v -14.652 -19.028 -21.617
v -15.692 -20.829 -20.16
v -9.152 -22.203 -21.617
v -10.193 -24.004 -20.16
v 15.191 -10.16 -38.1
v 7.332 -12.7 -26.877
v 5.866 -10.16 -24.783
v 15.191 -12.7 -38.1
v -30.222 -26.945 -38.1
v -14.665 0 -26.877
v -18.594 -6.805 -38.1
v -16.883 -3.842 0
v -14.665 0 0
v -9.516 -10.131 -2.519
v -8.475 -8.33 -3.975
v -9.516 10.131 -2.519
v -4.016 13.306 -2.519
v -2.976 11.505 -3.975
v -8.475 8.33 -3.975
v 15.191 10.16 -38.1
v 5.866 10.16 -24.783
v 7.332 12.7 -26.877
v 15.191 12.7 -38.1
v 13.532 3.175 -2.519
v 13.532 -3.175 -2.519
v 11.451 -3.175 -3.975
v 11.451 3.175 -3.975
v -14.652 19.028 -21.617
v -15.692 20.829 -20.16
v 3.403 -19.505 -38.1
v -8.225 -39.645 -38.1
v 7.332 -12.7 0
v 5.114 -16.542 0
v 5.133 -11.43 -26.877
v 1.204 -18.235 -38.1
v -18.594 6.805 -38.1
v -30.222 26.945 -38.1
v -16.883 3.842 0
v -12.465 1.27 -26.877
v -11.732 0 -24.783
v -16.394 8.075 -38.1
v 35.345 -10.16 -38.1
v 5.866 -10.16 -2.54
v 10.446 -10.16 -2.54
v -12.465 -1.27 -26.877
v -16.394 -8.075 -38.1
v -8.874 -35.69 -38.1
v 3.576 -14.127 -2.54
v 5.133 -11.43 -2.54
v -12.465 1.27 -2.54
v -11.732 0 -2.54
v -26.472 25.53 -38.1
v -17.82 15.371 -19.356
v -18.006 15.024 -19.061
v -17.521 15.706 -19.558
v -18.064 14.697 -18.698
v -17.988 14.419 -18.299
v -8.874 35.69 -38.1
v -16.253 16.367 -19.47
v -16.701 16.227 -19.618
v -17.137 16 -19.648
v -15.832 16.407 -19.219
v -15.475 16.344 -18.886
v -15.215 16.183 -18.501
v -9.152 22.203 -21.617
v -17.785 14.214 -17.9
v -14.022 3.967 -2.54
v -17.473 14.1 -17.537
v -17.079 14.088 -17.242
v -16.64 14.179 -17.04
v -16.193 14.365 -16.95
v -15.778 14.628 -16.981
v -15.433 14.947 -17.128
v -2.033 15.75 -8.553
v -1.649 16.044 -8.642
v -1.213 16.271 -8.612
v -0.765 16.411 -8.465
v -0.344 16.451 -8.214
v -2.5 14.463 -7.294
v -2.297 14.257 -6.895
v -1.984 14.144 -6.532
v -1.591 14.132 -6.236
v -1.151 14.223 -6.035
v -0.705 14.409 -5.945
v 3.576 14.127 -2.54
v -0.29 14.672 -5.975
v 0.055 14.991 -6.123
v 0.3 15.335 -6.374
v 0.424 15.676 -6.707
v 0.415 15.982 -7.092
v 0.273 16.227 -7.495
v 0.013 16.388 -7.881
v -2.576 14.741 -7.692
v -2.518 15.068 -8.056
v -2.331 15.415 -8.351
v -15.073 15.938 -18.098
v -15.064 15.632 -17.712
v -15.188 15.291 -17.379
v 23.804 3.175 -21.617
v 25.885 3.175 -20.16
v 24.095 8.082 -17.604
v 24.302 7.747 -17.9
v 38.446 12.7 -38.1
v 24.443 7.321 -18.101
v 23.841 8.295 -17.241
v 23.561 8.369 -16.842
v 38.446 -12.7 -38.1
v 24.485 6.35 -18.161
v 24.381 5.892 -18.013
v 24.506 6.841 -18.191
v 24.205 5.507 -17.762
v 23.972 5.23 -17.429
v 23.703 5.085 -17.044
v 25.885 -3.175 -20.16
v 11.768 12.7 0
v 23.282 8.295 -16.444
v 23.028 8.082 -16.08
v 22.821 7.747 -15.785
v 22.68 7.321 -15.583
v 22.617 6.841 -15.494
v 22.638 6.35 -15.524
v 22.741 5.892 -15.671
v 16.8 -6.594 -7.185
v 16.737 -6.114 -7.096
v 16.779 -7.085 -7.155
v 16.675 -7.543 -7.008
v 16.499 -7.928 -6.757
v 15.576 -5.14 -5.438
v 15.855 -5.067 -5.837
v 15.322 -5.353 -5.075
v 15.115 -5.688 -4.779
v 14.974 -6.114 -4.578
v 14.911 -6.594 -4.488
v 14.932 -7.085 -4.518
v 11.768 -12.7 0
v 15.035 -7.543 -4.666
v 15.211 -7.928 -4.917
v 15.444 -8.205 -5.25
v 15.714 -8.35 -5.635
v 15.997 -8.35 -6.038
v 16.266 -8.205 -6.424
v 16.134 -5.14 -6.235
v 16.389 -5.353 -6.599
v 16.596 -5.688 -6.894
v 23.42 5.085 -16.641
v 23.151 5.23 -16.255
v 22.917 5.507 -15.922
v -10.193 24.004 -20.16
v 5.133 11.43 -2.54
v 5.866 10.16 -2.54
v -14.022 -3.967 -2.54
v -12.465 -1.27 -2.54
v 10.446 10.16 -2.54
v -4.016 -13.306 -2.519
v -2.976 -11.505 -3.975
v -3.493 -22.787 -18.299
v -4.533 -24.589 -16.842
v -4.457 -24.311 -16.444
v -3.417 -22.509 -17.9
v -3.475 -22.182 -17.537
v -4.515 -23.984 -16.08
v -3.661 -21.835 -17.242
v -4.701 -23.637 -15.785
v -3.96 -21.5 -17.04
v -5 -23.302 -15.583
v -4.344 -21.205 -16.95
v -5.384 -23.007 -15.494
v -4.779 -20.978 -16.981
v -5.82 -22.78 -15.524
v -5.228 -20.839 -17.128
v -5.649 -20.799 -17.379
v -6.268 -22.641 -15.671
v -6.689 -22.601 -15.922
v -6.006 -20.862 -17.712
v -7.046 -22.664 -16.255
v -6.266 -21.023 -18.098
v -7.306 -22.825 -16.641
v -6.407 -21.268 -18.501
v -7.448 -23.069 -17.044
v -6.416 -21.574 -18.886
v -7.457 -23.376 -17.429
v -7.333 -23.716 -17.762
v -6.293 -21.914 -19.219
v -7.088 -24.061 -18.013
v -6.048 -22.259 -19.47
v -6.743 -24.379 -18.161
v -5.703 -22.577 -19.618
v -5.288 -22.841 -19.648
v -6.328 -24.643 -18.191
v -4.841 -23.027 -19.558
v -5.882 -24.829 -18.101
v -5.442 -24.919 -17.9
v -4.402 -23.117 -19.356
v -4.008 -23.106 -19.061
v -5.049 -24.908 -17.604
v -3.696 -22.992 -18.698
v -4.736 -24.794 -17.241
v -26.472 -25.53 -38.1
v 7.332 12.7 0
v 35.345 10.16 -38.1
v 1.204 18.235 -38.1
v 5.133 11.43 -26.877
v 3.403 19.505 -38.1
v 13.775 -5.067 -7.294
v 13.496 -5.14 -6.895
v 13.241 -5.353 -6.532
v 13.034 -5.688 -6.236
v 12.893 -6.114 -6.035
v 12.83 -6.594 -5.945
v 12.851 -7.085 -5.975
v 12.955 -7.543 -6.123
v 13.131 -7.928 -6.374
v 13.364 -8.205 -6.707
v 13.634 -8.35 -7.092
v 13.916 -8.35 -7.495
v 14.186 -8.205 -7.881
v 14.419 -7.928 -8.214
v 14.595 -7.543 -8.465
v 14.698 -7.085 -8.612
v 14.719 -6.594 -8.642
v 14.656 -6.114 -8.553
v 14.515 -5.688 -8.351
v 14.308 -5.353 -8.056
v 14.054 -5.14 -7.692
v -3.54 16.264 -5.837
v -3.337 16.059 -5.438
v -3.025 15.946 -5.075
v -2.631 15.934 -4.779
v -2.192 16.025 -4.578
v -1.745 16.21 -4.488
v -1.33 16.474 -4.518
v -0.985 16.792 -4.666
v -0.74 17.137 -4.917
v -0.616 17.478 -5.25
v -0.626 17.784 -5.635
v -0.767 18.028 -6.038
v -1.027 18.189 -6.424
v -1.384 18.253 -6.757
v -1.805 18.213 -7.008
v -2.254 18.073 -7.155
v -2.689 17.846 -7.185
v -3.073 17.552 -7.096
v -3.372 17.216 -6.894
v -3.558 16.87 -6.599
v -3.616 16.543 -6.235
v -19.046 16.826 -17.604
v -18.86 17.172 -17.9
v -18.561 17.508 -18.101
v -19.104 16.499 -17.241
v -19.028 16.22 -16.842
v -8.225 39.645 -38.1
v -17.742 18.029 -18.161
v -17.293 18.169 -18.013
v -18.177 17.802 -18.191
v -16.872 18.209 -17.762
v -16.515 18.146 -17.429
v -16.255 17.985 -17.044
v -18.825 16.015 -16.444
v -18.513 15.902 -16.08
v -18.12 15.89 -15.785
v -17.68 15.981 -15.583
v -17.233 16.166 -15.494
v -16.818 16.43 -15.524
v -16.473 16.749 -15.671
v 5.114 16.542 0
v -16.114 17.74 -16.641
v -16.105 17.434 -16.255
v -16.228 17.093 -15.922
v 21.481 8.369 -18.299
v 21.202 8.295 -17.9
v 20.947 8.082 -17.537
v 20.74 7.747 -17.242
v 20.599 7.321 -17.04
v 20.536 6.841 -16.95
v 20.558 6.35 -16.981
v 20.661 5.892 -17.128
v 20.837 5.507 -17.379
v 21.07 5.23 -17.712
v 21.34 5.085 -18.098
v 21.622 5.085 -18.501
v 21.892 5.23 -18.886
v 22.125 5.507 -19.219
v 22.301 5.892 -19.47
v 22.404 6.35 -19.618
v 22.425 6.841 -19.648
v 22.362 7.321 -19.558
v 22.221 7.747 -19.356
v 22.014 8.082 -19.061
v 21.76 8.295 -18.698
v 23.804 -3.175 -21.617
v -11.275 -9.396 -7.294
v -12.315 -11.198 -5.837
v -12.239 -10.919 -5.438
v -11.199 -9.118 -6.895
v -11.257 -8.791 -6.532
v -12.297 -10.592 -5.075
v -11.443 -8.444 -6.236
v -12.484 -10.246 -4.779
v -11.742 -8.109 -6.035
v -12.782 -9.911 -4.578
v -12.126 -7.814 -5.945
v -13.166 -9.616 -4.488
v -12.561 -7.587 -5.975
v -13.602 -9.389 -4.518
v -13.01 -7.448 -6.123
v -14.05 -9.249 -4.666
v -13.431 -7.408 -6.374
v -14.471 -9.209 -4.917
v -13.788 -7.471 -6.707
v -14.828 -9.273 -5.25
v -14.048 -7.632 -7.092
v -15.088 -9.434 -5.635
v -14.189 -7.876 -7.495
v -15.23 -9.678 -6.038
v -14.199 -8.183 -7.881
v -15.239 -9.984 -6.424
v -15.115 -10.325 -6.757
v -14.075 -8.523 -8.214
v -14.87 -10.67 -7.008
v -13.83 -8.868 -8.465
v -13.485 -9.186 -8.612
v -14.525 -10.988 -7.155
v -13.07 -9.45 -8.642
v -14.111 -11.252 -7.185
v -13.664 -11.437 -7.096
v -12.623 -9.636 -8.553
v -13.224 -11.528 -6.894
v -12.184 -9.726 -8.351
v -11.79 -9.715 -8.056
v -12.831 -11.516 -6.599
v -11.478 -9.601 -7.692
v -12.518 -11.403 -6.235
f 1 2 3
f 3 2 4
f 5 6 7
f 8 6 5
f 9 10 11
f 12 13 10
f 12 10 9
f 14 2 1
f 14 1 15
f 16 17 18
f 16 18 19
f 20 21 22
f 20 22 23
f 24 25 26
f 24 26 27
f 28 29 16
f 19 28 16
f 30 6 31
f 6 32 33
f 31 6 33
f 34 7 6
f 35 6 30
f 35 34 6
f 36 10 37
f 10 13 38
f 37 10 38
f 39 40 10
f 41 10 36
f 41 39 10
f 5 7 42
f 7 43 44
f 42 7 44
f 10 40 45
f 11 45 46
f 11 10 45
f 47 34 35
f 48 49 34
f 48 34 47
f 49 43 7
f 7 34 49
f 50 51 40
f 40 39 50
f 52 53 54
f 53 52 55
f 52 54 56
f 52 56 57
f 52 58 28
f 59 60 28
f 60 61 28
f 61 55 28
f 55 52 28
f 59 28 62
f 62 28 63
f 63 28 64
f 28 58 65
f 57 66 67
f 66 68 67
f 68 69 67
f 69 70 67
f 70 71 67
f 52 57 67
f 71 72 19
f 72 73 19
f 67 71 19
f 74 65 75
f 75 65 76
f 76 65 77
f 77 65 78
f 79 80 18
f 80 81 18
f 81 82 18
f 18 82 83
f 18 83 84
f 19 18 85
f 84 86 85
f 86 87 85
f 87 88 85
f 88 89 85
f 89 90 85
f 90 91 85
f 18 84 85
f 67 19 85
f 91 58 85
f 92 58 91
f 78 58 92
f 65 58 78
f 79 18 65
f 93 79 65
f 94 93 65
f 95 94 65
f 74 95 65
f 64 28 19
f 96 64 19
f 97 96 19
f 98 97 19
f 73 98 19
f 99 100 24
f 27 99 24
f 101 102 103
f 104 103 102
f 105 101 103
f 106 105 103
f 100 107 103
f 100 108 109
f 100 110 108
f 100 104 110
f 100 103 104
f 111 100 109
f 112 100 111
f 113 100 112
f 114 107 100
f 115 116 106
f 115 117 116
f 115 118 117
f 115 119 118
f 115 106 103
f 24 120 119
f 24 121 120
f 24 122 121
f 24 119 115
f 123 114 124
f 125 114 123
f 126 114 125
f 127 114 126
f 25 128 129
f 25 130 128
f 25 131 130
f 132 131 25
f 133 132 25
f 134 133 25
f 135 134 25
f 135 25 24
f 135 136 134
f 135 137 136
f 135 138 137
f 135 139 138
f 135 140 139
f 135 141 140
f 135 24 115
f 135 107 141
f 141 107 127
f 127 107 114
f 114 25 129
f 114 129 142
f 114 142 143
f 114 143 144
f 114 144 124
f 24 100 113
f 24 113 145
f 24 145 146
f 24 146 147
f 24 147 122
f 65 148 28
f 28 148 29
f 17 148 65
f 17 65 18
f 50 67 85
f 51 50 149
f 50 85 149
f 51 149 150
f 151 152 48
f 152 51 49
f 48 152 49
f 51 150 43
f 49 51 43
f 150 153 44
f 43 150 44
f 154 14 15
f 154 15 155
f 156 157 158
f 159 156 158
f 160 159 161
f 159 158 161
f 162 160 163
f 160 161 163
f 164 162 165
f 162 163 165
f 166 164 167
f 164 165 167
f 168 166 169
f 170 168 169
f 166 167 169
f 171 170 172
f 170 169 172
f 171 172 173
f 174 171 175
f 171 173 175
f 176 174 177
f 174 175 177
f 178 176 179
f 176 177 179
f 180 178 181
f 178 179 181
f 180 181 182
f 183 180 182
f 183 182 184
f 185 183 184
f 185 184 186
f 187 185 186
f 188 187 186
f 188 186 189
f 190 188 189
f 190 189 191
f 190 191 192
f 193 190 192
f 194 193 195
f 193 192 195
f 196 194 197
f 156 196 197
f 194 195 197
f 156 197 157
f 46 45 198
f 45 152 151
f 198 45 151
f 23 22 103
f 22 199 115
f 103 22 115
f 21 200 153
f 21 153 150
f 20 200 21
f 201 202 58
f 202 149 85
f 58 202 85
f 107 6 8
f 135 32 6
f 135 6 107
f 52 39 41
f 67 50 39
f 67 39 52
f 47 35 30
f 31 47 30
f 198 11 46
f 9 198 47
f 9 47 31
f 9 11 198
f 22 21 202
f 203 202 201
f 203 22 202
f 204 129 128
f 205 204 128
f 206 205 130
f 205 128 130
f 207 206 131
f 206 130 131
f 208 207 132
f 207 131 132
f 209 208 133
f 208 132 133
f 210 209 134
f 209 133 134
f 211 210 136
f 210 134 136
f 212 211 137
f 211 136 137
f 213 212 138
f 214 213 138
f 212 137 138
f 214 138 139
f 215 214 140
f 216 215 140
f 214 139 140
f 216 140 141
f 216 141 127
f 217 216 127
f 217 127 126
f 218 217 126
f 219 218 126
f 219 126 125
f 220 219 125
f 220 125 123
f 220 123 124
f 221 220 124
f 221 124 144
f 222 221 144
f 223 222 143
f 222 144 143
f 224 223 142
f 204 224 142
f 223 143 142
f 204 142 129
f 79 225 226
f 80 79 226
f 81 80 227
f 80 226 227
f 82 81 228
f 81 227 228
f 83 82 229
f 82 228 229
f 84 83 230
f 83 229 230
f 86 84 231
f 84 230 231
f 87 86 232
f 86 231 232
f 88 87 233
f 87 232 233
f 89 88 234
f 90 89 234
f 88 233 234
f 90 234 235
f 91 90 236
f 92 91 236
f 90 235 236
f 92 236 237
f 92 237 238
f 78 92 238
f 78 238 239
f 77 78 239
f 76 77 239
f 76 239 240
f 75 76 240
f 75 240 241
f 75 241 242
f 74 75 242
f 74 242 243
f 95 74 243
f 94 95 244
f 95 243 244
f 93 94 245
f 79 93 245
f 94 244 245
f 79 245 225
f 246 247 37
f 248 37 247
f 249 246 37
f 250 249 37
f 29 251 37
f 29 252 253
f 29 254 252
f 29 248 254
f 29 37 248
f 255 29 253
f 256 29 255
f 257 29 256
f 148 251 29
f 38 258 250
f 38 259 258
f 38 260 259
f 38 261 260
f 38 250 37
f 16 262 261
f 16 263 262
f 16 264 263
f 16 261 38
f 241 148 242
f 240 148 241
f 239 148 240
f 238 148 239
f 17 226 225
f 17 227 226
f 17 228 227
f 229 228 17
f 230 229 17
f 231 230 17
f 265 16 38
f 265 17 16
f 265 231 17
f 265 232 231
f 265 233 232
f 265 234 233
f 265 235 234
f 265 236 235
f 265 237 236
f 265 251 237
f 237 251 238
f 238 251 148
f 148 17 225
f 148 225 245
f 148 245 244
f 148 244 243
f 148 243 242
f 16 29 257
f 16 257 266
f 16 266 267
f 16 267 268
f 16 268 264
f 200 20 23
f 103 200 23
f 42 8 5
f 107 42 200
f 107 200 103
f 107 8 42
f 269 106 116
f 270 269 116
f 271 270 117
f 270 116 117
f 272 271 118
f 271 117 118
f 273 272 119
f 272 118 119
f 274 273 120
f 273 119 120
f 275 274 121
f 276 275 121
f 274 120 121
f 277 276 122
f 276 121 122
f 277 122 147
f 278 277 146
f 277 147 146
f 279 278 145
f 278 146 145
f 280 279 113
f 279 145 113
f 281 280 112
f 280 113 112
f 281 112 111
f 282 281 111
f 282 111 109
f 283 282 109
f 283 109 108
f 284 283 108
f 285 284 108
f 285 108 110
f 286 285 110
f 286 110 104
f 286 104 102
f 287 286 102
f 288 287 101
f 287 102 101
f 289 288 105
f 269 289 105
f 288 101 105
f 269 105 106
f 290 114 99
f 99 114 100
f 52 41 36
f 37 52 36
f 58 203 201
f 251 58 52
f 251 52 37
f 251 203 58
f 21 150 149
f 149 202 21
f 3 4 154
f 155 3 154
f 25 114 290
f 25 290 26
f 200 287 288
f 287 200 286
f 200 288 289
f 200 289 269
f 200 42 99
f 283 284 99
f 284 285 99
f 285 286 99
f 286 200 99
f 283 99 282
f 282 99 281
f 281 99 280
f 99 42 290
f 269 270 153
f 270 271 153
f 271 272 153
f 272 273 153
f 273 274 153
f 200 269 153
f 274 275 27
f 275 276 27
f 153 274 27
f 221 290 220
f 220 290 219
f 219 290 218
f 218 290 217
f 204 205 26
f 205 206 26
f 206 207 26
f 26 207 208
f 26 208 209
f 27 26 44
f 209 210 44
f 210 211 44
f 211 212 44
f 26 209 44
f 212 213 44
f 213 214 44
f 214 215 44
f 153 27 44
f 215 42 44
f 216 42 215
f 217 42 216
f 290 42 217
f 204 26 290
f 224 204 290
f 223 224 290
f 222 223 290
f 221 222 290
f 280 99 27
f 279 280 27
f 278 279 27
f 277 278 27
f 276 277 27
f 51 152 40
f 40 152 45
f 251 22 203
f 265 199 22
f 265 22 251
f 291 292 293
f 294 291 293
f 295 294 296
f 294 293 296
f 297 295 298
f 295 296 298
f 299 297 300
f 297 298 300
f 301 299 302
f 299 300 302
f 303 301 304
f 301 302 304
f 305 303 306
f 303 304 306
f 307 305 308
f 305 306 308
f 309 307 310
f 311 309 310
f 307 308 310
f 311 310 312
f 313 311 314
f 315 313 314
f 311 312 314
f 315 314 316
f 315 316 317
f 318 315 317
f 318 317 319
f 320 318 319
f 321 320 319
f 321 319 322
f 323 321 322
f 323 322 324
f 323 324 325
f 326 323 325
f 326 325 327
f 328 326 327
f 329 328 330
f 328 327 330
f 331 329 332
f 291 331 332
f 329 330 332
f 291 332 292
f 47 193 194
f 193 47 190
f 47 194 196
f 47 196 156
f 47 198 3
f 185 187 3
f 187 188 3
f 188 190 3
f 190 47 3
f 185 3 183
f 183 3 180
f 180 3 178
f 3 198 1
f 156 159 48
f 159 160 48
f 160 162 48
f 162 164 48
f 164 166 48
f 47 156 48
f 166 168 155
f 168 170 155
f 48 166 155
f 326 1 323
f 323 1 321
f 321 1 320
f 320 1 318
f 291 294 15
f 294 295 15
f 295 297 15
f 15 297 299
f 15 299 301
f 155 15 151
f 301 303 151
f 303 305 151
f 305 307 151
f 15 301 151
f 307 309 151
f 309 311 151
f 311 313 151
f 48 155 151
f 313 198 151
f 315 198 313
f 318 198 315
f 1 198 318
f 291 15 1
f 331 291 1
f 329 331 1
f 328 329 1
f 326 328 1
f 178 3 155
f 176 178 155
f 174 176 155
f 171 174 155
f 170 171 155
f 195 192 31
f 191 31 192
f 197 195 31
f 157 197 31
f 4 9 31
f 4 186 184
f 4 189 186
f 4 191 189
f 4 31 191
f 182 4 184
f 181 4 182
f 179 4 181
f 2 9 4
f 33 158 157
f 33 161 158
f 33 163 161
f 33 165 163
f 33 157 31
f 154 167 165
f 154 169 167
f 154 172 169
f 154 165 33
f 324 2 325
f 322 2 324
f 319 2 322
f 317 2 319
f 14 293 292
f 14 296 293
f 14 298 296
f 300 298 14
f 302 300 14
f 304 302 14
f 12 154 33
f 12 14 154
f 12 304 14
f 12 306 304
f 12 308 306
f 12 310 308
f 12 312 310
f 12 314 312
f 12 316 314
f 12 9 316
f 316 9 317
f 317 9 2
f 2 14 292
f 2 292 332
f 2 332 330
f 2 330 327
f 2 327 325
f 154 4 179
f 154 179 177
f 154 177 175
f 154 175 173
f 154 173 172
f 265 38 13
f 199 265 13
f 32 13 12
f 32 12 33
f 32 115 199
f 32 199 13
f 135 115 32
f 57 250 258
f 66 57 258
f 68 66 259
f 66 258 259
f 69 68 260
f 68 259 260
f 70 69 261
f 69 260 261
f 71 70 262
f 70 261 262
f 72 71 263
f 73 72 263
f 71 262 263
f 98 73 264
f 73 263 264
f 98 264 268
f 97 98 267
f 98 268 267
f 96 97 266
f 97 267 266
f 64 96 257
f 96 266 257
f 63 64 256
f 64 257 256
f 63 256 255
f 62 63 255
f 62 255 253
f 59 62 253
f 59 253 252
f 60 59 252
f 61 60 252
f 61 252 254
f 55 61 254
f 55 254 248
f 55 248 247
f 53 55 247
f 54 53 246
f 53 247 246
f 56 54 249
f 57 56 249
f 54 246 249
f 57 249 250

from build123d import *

# Parameters (mm, degrees)
F1_DEPTH        = 12.7
F3_COUNT        = 3
F4_T            = 2.54
F4_T3_DEPTH     = 31.9573897847
F5_W            = 6.35
F5_H            = 21.5367313986
F5_R            = 1.651
F6_DEPTH        = 2.54
F6_COPIES_COUNT = 3


# Not quite as in the source:
# - a pattern or mirror of a feature is missing from the dataset's text; its kind, count and spacing are read off the source's solid
# - a shell that OpenCascade refuses in one call is made with other operations: the cavity is built on its own and cut out


with BuildPart() as f1:
    # F0 (on Front) → F1 (new body, symmetric)
    with BuildSketch(Plane.XZ):
        Polygon((11.7683534, 0), (0, 0), (0, -16.4057110057), (15.1905046899, -38.1), (38.4462606058, -38.1), align=None)
    extrude(amount=F1_DEPTH, both=True)

    # F3: F1 ×3 about axis
    f3_axis = Axis((0, 0, -8.2028555029), (0, 0, -1))


with BuildPart() as f1_1:
    add(f1.part)
    for i in range(1, F3_COUNT):
        add(f1.part.rotate(f3_axis, i * 360 / F3_COUNT))

    # F4: shell of thickness 2.54, made by hand


with BuildPart() as f4_core1:
    # F4_t2: copy of F1
    add(f1_1.part)

    # the walls: a layer under each face that stays
    f4_faces = [f4_core1.faces().sort_by_distance(p)[0] for p in [
        (-2.557172964, 0, 0),
        (22.8893045122, -12.7, -19.05),
        (-0.4461296281, -26.1727191826, -19.05),
        (-12.5536535014, -21.7435656851, -19.05),
        (-22.4431748842, -13.4727191826, -19.05),
        (22.8893045122, 12.7, -19.05),
        (25.1073070029, 0, -19.05),
        (-22.4431748842, 13.4727191826, -19.05),
        (-0.4461296281, 26.1727191826, -19.05),
        (-12.5536535014, 21.7435656851, -19.05),
    ]]
    thicken(f4_faces, amount=-F4_T, mode=Mode.SUBTRACT)

    # F4_s4 → F4_t3 (cut)
    with BuildSketch(Plane.XY.offset(-29.4173897847)):
        Polygon((7.354345464, -12.7381), (7.3323484187, -10.16), (5.865878735, -10.16), (5.1326438931, -11.43), align=None)
        Polygon((-14.7086909279, 0), (-12.4649923118, -1.27), (-11.7317574699, 0), (-12.4649923118, 1.27), align=None)
        Polygon((7.354345464, 12.7381), (7.3323484187, 10.16), (5.865878735, 10.16), (5.1326438931, 11.43), align=None)
    extrude(amount=F4_T3_DEPTH, mode=Mode.SUBTRACT)


with BuildPart() as f1_2:
    add(f1_1.part)

    # what is left inside the walls is the cavity
    f4_cavity = [f4_core1.part.solids().sort_by_distance(p)[0] for p in [
        (22.874997, 3.386667, -20.334569),
    ]]
    add(f4_cavity, mode=Mode.SUBTRACT)

    # F5 (on face) → F6 (cut)
    with BuildSketch(Plane(origin=(7.8966836583, 0, 5.5293174244), x_dir=(0, 1, 0), z_dir=(0.8191520443, 0, 0.5735764364))):
        with Locations((0, -20.5930502049)):
            Rectangle(F5_W, F5_H)
        with Locations((6.7175144213, -27.3105646262)):
            Circle(F5_R)
        with Locations((-6.7175144213, -13.8755357836)):
            Circle(F5_R)
    f6 = extrude(amount=-F6_DEPTH, mode=Mode.SUBTRACT)

    # F6_copies: F6 ×3 about axis
    f6_copies_axis = Axis((0, 0, 0), (0, 0, 1))
    for i in range(1, F6_COPIES_COUNT):
        add(f6.rotate(f6_copies_axis, i * 360 / F6_COPIES_COUNT), mode=Mode.SUBTRACT)


solid = f1_2.part
